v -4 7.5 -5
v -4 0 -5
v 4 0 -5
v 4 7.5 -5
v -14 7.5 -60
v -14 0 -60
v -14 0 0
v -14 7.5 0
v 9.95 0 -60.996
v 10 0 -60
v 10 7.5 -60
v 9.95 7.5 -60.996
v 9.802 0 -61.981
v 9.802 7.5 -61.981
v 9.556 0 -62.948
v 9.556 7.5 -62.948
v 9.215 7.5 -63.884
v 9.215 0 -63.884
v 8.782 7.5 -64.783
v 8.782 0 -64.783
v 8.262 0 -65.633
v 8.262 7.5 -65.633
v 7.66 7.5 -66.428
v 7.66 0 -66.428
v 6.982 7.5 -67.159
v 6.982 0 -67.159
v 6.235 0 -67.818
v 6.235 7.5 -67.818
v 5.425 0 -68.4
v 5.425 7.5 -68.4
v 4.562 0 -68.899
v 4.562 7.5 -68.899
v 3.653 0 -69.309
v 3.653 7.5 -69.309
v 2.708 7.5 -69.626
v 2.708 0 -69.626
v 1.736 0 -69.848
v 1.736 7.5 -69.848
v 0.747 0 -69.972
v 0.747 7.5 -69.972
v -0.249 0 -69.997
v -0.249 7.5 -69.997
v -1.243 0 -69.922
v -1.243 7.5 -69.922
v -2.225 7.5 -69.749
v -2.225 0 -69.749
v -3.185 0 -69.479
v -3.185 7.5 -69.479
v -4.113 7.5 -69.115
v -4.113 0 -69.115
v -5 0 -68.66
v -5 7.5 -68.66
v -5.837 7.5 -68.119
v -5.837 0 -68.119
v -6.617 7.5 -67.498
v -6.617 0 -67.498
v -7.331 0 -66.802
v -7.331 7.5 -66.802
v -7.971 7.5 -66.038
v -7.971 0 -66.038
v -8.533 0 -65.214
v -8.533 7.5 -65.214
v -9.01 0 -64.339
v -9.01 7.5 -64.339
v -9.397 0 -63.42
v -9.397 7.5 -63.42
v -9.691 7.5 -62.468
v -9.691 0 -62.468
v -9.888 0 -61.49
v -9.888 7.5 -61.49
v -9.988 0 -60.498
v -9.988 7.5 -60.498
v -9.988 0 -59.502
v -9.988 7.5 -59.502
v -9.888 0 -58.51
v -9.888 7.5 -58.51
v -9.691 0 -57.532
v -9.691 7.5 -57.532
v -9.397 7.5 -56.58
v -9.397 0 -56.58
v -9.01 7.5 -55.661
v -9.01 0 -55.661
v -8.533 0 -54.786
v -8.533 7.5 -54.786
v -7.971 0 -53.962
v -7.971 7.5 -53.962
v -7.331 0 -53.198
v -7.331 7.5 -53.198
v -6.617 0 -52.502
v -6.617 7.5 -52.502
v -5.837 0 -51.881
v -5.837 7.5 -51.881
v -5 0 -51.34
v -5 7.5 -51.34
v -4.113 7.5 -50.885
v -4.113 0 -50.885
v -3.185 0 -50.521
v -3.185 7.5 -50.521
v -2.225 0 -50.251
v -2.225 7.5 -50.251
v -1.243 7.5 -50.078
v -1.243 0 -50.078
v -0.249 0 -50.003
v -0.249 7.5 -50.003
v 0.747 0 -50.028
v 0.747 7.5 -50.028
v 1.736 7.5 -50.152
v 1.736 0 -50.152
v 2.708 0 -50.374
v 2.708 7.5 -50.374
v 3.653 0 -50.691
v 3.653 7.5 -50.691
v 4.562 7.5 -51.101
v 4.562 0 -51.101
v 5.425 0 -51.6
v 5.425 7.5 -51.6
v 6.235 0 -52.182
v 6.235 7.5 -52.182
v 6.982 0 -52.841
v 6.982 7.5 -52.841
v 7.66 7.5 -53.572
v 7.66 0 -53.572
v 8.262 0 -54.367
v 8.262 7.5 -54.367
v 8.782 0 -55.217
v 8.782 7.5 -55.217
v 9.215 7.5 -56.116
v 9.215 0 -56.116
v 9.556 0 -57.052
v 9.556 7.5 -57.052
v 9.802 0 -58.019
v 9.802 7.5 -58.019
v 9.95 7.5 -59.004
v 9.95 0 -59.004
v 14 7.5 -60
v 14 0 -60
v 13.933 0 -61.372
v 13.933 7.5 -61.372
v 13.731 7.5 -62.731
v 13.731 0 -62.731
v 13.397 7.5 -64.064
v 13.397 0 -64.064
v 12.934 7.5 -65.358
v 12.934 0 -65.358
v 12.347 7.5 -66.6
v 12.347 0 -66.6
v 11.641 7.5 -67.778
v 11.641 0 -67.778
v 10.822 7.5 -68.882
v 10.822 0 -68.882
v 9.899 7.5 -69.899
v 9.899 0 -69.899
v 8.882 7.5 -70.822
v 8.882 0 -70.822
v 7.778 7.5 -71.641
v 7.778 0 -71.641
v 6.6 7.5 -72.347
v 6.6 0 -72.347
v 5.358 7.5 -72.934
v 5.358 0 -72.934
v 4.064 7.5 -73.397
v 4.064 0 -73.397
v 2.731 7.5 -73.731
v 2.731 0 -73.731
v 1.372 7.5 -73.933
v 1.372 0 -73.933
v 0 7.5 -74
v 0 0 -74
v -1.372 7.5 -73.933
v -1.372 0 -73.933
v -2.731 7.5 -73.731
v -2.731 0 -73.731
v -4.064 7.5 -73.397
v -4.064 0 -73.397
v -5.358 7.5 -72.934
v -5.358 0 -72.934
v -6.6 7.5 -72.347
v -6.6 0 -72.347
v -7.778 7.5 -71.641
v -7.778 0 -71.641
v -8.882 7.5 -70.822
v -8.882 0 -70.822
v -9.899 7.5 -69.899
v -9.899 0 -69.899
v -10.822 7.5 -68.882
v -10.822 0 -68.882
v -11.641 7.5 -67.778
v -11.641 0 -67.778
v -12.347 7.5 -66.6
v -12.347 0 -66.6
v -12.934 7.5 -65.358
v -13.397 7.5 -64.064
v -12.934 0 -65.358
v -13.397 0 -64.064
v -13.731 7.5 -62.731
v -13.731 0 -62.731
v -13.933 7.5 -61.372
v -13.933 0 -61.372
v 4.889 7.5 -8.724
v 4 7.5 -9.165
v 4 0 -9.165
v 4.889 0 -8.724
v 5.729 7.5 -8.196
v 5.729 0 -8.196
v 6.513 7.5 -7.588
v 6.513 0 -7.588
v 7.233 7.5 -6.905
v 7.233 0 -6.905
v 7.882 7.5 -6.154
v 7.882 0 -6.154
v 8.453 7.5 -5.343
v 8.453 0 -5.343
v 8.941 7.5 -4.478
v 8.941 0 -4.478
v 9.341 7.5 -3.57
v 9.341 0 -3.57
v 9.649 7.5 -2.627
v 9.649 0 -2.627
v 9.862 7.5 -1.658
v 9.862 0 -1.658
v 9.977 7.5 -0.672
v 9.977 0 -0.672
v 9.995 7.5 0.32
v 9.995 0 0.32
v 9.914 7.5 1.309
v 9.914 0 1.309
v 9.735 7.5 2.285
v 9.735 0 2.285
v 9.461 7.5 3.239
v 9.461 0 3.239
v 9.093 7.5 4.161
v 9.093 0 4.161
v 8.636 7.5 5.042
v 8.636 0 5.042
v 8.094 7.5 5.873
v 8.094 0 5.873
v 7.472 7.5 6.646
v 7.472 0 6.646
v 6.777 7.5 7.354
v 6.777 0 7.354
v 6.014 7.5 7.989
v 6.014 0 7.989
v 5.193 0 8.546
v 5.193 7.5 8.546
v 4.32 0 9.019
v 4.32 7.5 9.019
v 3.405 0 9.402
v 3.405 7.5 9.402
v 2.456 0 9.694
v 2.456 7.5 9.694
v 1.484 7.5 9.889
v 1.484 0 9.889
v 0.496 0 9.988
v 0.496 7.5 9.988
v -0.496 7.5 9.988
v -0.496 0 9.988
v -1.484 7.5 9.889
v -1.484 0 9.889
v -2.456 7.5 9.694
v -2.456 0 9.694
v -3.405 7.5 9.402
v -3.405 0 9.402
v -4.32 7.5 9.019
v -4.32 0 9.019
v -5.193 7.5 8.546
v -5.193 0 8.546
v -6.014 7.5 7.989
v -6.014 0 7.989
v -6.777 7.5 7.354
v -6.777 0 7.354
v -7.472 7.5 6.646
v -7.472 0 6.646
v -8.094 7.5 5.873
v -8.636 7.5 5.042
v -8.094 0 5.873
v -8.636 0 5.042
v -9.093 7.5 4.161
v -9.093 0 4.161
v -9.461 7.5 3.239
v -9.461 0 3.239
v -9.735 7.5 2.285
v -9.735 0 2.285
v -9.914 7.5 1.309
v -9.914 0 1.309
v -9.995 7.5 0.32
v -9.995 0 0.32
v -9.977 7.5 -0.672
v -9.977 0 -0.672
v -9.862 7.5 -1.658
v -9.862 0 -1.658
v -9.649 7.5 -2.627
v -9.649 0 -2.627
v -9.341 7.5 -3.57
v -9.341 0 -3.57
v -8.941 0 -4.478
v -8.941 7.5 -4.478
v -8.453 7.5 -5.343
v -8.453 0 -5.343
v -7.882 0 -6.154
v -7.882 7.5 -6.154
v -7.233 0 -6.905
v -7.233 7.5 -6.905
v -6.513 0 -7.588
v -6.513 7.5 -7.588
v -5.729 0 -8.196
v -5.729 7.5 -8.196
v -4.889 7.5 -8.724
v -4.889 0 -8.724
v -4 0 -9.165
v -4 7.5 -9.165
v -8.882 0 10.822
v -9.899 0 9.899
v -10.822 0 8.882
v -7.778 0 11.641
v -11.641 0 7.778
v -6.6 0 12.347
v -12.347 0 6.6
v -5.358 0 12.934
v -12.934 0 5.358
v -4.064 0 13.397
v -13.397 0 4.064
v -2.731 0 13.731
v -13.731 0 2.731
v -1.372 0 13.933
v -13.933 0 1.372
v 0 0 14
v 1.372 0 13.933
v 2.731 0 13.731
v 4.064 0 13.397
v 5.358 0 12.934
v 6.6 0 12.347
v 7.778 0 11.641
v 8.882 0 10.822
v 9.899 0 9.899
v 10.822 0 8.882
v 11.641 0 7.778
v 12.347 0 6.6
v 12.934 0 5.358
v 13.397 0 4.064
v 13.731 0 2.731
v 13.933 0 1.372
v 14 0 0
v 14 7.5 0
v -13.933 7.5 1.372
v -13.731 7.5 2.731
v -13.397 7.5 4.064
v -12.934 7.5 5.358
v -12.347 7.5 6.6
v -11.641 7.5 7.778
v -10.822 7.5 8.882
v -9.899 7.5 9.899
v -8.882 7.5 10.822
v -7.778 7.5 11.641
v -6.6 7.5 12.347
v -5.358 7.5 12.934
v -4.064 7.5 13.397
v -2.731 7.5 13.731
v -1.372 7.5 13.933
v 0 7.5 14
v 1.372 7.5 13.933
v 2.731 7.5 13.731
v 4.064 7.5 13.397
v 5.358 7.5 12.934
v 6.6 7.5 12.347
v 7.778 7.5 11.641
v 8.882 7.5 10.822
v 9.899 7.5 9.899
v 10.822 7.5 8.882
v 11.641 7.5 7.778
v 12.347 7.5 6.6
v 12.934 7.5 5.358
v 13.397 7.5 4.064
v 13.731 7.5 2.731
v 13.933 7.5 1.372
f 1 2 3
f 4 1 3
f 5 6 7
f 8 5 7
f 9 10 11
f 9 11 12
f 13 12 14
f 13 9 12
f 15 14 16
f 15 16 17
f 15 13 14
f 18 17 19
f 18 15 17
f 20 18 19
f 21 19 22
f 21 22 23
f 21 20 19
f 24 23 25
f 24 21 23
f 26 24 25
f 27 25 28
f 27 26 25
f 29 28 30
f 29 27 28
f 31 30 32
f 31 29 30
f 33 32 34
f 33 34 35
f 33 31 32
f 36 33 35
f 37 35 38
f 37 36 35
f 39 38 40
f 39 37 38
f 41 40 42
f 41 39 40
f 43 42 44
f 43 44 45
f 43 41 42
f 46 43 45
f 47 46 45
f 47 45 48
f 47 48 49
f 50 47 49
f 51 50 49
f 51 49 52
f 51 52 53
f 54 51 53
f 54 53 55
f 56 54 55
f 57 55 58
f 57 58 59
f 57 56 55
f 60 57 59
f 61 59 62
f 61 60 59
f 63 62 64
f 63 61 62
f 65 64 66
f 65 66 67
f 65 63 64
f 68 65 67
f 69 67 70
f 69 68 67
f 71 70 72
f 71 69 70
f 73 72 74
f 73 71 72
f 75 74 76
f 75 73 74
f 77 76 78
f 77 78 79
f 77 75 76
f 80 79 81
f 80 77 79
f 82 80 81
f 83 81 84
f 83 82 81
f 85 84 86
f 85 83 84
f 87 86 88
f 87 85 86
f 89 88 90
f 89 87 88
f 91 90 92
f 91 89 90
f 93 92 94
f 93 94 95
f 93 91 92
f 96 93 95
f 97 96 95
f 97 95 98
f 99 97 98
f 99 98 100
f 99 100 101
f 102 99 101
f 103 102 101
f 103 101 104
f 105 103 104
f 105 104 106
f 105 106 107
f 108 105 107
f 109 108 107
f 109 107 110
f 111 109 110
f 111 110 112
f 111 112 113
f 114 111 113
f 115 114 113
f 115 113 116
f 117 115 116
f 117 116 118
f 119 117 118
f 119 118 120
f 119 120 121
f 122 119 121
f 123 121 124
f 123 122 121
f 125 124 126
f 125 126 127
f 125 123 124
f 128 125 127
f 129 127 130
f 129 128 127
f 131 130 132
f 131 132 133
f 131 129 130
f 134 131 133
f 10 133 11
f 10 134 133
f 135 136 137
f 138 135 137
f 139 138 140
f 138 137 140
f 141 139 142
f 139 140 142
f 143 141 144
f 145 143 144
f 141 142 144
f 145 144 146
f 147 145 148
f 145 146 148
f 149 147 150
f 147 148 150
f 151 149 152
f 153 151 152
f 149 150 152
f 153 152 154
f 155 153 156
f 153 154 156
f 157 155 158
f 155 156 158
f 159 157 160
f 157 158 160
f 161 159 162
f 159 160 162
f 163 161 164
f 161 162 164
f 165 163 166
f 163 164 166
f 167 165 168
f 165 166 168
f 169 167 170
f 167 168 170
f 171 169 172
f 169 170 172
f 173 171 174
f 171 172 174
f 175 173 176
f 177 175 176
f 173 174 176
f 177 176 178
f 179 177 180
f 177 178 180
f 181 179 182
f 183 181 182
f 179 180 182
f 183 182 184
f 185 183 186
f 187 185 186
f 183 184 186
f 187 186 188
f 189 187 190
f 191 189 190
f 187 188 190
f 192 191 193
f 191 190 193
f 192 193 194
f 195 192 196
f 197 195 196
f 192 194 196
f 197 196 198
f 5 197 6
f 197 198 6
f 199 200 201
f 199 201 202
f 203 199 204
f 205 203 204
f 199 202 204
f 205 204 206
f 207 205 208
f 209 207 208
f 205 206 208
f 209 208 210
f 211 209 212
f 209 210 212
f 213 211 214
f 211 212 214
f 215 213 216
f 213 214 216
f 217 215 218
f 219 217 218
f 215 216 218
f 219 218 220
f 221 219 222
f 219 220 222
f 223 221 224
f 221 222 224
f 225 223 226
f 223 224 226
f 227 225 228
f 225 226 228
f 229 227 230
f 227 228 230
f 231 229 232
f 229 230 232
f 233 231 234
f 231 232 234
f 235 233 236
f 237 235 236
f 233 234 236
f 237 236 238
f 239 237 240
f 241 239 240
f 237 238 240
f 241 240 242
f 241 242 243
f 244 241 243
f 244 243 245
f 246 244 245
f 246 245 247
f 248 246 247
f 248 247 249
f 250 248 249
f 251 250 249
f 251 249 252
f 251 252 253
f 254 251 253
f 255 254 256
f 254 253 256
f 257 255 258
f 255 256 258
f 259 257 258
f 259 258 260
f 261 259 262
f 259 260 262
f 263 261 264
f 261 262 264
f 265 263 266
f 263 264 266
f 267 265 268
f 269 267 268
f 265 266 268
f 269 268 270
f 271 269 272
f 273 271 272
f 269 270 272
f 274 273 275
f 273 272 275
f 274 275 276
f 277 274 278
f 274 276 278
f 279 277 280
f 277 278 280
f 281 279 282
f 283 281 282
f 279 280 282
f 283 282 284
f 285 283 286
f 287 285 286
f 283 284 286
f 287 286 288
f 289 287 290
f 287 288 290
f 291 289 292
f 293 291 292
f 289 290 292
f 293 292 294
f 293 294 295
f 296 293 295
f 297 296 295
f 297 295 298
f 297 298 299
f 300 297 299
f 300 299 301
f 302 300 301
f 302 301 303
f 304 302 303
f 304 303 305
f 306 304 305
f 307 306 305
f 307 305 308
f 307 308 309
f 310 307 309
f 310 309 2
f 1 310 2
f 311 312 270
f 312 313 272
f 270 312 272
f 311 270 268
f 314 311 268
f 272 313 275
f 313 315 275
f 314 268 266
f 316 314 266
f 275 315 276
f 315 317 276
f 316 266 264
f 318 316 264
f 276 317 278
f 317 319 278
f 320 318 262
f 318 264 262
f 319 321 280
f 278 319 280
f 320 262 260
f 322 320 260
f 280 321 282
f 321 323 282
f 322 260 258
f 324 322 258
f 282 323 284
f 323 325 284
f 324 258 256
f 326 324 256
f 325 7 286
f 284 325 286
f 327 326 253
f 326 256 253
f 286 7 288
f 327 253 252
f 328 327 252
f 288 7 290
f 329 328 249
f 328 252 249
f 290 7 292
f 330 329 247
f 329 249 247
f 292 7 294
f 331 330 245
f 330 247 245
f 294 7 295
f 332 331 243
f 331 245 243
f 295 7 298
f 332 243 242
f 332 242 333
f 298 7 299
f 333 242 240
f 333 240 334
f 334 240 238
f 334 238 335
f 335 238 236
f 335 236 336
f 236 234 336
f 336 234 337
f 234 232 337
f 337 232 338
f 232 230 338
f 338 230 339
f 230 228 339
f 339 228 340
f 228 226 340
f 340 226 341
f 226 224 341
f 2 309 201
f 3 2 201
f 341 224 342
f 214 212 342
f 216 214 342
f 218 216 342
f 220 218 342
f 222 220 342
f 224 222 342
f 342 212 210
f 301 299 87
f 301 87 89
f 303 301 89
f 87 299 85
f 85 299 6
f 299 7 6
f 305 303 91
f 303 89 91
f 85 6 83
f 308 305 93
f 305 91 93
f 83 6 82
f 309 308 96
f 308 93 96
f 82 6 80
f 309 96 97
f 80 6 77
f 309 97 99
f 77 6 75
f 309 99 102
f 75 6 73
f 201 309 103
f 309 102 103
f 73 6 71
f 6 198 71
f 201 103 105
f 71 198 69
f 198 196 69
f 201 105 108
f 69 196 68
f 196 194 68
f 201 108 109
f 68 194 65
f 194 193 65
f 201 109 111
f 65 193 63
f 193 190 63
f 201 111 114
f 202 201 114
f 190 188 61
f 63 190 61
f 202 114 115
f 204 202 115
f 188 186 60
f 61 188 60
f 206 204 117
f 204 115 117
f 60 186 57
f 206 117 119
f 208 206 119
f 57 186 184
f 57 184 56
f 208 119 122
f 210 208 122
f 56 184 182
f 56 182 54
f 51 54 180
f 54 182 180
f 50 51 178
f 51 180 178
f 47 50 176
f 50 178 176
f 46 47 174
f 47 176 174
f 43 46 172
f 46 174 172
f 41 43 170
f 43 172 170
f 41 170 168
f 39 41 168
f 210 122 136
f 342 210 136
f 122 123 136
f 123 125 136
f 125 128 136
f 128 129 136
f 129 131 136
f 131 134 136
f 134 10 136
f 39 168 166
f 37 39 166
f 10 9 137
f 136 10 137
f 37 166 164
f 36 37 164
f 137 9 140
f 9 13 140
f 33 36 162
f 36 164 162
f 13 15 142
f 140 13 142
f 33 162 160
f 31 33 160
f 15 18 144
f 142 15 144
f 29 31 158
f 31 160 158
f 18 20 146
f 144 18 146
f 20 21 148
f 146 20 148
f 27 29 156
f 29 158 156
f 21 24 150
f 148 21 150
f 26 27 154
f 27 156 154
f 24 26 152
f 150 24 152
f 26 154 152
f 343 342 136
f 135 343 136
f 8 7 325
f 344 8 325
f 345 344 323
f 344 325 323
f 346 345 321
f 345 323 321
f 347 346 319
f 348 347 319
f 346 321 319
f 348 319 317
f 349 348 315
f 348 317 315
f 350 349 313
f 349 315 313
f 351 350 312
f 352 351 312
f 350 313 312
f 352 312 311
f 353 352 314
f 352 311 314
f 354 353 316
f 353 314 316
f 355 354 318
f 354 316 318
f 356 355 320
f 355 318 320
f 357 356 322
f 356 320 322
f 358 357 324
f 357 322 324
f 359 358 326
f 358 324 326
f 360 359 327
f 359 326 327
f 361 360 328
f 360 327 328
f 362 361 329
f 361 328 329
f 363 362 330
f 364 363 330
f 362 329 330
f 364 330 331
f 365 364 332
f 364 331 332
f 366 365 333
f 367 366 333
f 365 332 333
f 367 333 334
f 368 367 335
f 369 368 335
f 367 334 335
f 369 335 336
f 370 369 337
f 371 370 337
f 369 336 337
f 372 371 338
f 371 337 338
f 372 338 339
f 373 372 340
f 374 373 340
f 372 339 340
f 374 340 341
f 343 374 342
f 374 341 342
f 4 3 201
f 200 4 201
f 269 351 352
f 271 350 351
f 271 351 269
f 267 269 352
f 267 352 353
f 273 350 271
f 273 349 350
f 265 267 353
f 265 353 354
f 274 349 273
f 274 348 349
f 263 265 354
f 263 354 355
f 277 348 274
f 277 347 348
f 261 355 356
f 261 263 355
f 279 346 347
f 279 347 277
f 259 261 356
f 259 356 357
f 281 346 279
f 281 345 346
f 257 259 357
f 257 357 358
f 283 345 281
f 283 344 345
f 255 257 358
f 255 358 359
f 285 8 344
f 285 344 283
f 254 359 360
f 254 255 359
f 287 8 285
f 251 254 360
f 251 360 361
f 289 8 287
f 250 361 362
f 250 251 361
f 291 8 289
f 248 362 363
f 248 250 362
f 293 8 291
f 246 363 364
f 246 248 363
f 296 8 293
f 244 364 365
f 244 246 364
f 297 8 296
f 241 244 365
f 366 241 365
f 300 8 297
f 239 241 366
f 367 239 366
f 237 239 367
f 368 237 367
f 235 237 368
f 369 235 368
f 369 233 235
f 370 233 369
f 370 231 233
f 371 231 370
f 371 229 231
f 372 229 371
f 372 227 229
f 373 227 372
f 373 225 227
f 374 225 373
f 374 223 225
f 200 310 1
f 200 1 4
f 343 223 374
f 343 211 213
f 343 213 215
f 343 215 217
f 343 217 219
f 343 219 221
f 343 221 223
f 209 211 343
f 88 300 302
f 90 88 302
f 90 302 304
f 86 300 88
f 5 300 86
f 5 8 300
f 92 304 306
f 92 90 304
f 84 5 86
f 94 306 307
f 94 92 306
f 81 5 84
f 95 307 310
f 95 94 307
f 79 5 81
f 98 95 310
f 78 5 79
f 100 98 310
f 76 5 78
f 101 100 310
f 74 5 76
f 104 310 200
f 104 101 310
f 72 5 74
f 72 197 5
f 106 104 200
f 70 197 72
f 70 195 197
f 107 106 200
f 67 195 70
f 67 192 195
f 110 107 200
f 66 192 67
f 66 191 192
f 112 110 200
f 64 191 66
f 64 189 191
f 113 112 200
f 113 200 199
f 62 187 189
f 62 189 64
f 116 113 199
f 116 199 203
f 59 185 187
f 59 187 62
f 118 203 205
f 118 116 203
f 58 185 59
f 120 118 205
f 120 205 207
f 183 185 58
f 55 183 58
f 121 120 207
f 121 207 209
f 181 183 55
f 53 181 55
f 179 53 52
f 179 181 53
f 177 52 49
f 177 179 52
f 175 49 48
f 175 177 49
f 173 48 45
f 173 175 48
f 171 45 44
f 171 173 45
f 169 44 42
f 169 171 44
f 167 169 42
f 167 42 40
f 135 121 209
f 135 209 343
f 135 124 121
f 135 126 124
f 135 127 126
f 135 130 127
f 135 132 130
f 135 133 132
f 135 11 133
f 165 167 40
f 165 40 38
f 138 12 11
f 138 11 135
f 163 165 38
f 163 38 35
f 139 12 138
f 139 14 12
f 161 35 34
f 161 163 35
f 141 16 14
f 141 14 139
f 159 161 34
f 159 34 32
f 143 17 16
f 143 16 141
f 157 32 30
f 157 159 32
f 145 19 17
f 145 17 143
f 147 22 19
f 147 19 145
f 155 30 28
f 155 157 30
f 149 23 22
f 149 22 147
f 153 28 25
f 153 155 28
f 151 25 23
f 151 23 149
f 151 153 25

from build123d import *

# Parameters (mm, degrees)
SKETCH1_R           = 10
BOSS_EXTRUDE1_DEPTH = 7.5


with BuildPart() as part:
    # Sketch1 → Boss-Extrude1 (new body)
    with BuildSketch(Plane(origin=(0, 0, 0), x_dir=(1, 0, 0), z_dir=(0, 1, 0))):
        with BuildLine():
            Line((14, 0), (14, 60))
            ThreePointArc((14, 60), (0, 74), (-14, 60))
            Line((-14, 60), (-14, 0))
            ThreePointArc((-14, 0), (0, -14), (14, 0))
        make_face()
        with BuildLine():
            ThreePointArc((4, 9.16515139), (0, -10), (-4, 9.16515139))
            Line((-4, 9.16515139), (-4, 5))
            Line((-4, 5), (4, 5))
            Line((4, 5), (4, 9.16515139))
        make_face(mode=Mode.SUBTRACT)
        with Locations((0, 60)):
            Circle(SKETCH1_R, mode=Mode.SUBTRACT)
    extrude(amount=BOSS_EXTRUDE1_DEPTH)


solid = part.part
